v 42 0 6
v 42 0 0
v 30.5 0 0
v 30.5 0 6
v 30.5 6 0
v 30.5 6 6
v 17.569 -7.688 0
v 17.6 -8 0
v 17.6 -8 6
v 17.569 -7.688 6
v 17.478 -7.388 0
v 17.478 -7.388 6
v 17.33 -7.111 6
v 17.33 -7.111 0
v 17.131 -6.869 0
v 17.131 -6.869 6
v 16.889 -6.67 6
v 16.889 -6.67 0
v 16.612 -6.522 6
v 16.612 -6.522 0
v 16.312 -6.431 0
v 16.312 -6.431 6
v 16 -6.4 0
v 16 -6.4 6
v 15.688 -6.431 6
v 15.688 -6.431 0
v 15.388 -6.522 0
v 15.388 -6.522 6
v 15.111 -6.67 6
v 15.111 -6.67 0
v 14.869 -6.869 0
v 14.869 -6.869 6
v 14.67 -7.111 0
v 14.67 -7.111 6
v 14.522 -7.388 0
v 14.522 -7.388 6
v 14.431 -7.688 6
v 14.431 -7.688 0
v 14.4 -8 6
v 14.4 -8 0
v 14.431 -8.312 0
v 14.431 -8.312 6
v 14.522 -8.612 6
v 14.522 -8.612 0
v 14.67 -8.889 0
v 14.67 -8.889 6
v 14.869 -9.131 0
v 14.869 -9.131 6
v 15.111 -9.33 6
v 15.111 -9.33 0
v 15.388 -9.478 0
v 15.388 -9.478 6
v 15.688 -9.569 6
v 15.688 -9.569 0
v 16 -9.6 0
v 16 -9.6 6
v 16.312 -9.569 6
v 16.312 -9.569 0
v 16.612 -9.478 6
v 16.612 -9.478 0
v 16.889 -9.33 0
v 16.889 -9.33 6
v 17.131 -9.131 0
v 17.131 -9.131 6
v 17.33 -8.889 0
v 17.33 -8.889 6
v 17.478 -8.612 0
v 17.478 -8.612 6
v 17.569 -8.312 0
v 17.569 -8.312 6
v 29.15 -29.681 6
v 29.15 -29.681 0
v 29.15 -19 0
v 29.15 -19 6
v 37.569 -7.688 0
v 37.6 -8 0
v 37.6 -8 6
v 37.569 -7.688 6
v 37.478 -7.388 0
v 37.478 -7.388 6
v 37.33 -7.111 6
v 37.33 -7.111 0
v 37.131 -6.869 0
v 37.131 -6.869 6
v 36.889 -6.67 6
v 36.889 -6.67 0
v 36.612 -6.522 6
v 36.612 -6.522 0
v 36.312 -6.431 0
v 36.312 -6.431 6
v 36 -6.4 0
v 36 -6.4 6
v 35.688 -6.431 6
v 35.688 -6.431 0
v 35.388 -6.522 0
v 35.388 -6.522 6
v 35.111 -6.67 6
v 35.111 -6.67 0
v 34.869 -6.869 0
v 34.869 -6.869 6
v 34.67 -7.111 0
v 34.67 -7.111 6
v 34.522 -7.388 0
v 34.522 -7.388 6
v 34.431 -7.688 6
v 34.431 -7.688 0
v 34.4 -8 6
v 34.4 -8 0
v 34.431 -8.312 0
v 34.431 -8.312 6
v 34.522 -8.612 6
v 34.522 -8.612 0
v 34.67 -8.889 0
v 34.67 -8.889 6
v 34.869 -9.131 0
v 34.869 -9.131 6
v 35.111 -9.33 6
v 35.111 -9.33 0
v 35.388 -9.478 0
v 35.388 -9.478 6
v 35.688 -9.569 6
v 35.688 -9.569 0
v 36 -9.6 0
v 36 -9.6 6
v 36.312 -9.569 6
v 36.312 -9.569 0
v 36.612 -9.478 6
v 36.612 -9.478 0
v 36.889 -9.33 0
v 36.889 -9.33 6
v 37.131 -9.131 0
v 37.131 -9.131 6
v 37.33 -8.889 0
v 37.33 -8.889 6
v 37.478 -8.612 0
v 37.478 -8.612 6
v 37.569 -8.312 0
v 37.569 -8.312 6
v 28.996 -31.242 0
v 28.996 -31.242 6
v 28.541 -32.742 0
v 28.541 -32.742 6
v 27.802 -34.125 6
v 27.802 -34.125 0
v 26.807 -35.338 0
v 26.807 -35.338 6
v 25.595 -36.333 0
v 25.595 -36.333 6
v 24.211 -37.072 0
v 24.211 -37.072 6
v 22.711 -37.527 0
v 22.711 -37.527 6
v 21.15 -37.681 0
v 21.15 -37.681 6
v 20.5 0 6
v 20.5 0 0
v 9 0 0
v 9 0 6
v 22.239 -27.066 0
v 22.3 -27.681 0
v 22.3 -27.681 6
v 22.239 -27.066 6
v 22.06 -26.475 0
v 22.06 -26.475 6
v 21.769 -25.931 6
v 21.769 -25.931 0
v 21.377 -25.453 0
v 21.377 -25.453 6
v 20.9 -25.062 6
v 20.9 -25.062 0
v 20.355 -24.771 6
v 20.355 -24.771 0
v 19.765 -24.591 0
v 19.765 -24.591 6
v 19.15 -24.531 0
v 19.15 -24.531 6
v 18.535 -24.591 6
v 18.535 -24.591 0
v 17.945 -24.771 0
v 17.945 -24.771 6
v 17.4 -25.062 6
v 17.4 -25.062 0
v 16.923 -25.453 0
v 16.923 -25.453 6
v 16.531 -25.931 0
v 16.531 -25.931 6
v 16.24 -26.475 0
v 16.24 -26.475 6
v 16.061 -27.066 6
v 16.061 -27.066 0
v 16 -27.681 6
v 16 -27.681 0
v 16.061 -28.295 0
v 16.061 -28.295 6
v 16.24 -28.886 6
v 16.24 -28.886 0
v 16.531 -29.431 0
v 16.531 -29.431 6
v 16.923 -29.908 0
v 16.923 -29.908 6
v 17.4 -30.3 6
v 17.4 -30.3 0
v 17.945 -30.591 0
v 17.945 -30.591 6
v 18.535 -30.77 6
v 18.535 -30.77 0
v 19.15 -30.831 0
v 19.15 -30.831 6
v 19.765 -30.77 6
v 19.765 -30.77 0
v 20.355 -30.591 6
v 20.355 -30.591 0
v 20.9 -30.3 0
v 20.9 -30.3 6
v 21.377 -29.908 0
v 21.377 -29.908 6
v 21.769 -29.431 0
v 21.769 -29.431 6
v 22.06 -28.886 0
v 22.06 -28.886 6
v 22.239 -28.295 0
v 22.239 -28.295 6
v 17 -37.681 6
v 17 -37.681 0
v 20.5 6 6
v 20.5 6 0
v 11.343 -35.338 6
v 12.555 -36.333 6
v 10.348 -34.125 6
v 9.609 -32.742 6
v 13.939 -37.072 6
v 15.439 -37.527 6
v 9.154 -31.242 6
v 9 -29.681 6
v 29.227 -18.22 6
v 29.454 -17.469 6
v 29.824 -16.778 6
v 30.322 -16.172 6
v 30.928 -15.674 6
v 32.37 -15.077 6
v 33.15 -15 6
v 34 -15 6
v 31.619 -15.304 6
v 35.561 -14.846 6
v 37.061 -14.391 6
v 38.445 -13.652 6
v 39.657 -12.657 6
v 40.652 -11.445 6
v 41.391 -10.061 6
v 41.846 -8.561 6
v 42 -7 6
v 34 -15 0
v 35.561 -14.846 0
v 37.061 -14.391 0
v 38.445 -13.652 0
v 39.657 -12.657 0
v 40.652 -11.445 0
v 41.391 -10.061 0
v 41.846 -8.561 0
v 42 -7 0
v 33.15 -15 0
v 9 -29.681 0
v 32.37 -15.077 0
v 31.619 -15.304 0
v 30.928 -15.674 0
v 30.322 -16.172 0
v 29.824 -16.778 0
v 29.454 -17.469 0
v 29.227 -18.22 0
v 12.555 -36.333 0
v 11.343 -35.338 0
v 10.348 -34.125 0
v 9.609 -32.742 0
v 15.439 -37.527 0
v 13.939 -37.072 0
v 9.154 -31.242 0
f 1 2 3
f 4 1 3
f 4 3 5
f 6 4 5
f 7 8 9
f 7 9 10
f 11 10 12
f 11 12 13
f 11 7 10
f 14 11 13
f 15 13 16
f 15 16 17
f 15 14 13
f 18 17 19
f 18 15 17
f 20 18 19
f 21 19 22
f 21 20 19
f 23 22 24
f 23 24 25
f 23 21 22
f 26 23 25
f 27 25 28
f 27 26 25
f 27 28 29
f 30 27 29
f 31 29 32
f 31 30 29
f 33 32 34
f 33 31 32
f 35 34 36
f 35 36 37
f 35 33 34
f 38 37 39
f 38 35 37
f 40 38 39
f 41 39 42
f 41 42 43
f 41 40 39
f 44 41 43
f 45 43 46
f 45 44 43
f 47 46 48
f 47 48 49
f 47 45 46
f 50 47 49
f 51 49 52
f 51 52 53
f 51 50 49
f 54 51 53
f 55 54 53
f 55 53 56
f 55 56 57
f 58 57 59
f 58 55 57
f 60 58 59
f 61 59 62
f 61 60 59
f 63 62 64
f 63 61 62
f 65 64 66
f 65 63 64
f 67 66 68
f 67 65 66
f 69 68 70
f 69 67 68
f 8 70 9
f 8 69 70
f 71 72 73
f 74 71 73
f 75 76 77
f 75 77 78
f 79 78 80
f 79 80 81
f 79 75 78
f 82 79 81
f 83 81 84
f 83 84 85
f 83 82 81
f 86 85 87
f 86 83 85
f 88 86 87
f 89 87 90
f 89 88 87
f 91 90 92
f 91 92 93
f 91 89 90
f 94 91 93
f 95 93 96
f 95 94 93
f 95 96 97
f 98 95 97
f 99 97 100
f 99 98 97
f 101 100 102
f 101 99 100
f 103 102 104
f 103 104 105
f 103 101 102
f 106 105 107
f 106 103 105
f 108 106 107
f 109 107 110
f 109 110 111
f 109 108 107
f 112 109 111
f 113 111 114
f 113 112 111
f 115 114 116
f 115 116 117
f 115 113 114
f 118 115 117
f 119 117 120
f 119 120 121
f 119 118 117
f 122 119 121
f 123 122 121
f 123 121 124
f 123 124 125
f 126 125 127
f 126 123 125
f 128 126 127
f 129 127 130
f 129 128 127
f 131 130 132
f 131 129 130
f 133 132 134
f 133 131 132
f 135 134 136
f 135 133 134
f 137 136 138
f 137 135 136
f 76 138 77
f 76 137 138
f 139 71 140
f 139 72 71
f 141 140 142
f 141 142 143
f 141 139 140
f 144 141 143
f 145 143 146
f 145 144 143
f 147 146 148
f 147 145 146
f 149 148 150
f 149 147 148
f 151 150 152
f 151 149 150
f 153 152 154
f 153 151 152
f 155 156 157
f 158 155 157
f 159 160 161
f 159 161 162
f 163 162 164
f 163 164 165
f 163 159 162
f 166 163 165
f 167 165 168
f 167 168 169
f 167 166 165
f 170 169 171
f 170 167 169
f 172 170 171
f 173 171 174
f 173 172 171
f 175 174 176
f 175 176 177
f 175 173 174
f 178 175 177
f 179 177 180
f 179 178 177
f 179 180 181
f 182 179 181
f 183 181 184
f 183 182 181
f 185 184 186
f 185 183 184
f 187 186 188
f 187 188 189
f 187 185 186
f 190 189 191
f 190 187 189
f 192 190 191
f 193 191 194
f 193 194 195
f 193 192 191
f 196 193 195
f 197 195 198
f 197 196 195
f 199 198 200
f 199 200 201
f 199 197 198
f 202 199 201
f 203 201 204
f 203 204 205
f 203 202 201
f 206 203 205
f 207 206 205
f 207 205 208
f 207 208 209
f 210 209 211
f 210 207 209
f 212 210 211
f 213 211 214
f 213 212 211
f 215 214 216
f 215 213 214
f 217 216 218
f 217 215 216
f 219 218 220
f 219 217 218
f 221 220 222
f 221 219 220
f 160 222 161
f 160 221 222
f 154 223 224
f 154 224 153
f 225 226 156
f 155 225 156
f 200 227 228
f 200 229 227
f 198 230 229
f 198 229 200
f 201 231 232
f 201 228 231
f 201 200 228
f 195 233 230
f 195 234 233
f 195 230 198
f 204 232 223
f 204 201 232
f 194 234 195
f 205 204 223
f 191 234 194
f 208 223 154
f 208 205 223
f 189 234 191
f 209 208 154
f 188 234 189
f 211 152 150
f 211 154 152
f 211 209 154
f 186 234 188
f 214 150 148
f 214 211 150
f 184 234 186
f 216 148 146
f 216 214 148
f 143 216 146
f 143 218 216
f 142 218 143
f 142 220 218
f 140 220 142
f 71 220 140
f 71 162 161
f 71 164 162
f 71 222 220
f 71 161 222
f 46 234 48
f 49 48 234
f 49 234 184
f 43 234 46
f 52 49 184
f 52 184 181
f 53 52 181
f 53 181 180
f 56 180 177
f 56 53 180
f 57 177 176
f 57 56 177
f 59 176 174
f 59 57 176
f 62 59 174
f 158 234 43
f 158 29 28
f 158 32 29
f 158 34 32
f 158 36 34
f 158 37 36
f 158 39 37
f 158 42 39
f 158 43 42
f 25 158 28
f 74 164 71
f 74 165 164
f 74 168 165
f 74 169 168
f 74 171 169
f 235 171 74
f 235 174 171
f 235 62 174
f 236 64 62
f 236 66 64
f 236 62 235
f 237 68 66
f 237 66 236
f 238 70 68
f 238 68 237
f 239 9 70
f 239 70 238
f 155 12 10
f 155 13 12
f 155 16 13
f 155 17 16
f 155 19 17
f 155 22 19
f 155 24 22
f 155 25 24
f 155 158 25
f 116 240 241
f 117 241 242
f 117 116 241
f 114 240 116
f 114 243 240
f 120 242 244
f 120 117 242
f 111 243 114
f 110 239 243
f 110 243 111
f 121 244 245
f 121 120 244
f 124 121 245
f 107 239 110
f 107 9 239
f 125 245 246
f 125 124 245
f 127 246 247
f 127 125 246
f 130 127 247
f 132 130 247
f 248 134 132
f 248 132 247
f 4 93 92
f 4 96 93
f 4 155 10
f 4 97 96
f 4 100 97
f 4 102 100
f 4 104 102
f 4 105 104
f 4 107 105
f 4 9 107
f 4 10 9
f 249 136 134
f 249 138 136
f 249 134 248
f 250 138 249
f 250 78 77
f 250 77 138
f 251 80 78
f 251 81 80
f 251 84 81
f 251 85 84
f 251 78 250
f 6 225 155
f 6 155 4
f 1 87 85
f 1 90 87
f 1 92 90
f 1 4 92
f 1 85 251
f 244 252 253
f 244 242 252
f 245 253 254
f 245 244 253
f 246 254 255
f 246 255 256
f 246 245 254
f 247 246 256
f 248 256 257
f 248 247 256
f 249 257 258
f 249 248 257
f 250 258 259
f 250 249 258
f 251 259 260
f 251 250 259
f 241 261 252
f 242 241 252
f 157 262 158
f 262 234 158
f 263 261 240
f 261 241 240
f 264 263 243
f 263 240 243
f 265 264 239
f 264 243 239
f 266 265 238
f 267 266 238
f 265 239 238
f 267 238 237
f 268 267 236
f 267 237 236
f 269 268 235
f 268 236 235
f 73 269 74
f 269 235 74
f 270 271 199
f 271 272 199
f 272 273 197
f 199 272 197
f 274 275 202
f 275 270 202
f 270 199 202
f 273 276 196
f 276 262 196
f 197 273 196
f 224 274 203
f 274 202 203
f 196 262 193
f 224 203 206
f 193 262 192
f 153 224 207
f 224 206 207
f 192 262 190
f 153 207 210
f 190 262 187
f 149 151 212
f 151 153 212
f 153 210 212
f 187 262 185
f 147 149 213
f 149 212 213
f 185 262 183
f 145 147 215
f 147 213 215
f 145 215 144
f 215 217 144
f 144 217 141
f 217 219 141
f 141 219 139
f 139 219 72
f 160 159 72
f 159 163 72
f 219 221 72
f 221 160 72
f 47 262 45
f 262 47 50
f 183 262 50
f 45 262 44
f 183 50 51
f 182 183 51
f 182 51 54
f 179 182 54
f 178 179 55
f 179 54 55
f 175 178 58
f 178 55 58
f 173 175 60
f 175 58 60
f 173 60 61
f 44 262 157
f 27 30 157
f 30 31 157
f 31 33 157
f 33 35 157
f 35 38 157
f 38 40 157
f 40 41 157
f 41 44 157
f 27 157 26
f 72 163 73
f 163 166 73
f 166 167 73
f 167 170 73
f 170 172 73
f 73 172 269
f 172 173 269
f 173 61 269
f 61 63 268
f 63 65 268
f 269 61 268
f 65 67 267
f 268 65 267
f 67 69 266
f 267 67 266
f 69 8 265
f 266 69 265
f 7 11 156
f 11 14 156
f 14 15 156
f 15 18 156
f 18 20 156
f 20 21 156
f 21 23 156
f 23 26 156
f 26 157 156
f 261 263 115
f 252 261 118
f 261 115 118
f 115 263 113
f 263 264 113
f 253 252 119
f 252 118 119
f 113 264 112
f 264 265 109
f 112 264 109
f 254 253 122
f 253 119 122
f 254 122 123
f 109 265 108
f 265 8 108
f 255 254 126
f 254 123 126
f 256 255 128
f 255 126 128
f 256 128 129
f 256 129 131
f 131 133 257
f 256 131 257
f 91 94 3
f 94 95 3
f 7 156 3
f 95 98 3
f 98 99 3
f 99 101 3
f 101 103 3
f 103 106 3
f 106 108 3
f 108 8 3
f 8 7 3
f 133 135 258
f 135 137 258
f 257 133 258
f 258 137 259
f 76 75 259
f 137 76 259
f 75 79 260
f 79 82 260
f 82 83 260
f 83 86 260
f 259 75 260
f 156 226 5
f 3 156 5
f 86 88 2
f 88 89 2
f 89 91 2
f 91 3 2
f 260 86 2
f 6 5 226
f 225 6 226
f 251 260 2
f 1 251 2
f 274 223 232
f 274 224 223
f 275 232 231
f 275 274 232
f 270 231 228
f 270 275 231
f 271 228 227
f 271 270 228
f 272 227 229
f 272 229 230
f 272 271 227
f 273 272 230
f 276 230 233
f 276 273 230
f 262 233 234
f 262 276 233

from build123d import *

# Parameters (mm, degrees)
ESBO_O1_R                = 3.15
ESBO_O1_R_2              = 1.6
RESSALTO_EXTRUS_O1_DEPTH = 6
FILETE3_R                = 4
ESBO_O2_W                = 20.15
ESBO_O2_H                = 7.319150415
CORTE_EXTRUS_O1_DEPTH    = 10
FILETE2_R                = 8


with BuildPart() as part:
    # Esboço1 → Ressalto-extrusão1 (new body)
    with BuildSketch(Plane.XY):
        Polygon((20.5, 0), (9, 0), (9, -19), (0, -19), (0, -29), (6, -29), (6, -39), (0, -39), (0, -45), (29.15, -45), (29.15, -15), (42, -15), (42, 0), (30.5, 0), (30.5, 6), (20.5, 6), align=None)
        with Locations((19.15, -27.680849585)):
            Circle(ESBO_O1_R, mode=Mode.SUBTRACT)
        with Locations((16, -8)):
            Circle(ESBO_O1_R_2, mode=Mode.SUBTRACT)
        with Locations((36, -8)):
            Circle(ESBO_O1_R_2, mode=Mode.SUBTRACT)
    extrude(amount=RESSALTO_EXTRUS_O1_DEPTH)

    # Filete3
    filete3_edges = [part.edges().sort_by_distance(p)[0] for p in [
        (29.15, -15, 3),
    ]]
    fillet(filete3_edges, radius=FILETE3_R)

    # Esboço2 → Corte-extrusão1 (cut)
    with BuildSketch(Plane.XY.offset(6)):
        Polygon((9, -19), (0, -19), (0, -29), (6, -29), (6, -39), (0, -39), (0, -45), (9, -45), (9, -37.680849585), align=None)
        with Locations((19.075, -41.340424793)):
            Rectangle(ESBO_O2_W, ESBO_O2_H)
    extrude(amount=-CORTE_EXTRUS_O1_DEPTH, mode=Mode.SUBTRACT)

    # Filete2
    filete2_edges = [part.edges().sort_by_distance(p)[0] for p in [
        (42, -15, 3),
        (9, -37.680849585, 3),
        (29.15, -37.680849585, 3),
    ]]
    fillet(filete2_edges, radius=FILETE2_R)


solid = part.part
